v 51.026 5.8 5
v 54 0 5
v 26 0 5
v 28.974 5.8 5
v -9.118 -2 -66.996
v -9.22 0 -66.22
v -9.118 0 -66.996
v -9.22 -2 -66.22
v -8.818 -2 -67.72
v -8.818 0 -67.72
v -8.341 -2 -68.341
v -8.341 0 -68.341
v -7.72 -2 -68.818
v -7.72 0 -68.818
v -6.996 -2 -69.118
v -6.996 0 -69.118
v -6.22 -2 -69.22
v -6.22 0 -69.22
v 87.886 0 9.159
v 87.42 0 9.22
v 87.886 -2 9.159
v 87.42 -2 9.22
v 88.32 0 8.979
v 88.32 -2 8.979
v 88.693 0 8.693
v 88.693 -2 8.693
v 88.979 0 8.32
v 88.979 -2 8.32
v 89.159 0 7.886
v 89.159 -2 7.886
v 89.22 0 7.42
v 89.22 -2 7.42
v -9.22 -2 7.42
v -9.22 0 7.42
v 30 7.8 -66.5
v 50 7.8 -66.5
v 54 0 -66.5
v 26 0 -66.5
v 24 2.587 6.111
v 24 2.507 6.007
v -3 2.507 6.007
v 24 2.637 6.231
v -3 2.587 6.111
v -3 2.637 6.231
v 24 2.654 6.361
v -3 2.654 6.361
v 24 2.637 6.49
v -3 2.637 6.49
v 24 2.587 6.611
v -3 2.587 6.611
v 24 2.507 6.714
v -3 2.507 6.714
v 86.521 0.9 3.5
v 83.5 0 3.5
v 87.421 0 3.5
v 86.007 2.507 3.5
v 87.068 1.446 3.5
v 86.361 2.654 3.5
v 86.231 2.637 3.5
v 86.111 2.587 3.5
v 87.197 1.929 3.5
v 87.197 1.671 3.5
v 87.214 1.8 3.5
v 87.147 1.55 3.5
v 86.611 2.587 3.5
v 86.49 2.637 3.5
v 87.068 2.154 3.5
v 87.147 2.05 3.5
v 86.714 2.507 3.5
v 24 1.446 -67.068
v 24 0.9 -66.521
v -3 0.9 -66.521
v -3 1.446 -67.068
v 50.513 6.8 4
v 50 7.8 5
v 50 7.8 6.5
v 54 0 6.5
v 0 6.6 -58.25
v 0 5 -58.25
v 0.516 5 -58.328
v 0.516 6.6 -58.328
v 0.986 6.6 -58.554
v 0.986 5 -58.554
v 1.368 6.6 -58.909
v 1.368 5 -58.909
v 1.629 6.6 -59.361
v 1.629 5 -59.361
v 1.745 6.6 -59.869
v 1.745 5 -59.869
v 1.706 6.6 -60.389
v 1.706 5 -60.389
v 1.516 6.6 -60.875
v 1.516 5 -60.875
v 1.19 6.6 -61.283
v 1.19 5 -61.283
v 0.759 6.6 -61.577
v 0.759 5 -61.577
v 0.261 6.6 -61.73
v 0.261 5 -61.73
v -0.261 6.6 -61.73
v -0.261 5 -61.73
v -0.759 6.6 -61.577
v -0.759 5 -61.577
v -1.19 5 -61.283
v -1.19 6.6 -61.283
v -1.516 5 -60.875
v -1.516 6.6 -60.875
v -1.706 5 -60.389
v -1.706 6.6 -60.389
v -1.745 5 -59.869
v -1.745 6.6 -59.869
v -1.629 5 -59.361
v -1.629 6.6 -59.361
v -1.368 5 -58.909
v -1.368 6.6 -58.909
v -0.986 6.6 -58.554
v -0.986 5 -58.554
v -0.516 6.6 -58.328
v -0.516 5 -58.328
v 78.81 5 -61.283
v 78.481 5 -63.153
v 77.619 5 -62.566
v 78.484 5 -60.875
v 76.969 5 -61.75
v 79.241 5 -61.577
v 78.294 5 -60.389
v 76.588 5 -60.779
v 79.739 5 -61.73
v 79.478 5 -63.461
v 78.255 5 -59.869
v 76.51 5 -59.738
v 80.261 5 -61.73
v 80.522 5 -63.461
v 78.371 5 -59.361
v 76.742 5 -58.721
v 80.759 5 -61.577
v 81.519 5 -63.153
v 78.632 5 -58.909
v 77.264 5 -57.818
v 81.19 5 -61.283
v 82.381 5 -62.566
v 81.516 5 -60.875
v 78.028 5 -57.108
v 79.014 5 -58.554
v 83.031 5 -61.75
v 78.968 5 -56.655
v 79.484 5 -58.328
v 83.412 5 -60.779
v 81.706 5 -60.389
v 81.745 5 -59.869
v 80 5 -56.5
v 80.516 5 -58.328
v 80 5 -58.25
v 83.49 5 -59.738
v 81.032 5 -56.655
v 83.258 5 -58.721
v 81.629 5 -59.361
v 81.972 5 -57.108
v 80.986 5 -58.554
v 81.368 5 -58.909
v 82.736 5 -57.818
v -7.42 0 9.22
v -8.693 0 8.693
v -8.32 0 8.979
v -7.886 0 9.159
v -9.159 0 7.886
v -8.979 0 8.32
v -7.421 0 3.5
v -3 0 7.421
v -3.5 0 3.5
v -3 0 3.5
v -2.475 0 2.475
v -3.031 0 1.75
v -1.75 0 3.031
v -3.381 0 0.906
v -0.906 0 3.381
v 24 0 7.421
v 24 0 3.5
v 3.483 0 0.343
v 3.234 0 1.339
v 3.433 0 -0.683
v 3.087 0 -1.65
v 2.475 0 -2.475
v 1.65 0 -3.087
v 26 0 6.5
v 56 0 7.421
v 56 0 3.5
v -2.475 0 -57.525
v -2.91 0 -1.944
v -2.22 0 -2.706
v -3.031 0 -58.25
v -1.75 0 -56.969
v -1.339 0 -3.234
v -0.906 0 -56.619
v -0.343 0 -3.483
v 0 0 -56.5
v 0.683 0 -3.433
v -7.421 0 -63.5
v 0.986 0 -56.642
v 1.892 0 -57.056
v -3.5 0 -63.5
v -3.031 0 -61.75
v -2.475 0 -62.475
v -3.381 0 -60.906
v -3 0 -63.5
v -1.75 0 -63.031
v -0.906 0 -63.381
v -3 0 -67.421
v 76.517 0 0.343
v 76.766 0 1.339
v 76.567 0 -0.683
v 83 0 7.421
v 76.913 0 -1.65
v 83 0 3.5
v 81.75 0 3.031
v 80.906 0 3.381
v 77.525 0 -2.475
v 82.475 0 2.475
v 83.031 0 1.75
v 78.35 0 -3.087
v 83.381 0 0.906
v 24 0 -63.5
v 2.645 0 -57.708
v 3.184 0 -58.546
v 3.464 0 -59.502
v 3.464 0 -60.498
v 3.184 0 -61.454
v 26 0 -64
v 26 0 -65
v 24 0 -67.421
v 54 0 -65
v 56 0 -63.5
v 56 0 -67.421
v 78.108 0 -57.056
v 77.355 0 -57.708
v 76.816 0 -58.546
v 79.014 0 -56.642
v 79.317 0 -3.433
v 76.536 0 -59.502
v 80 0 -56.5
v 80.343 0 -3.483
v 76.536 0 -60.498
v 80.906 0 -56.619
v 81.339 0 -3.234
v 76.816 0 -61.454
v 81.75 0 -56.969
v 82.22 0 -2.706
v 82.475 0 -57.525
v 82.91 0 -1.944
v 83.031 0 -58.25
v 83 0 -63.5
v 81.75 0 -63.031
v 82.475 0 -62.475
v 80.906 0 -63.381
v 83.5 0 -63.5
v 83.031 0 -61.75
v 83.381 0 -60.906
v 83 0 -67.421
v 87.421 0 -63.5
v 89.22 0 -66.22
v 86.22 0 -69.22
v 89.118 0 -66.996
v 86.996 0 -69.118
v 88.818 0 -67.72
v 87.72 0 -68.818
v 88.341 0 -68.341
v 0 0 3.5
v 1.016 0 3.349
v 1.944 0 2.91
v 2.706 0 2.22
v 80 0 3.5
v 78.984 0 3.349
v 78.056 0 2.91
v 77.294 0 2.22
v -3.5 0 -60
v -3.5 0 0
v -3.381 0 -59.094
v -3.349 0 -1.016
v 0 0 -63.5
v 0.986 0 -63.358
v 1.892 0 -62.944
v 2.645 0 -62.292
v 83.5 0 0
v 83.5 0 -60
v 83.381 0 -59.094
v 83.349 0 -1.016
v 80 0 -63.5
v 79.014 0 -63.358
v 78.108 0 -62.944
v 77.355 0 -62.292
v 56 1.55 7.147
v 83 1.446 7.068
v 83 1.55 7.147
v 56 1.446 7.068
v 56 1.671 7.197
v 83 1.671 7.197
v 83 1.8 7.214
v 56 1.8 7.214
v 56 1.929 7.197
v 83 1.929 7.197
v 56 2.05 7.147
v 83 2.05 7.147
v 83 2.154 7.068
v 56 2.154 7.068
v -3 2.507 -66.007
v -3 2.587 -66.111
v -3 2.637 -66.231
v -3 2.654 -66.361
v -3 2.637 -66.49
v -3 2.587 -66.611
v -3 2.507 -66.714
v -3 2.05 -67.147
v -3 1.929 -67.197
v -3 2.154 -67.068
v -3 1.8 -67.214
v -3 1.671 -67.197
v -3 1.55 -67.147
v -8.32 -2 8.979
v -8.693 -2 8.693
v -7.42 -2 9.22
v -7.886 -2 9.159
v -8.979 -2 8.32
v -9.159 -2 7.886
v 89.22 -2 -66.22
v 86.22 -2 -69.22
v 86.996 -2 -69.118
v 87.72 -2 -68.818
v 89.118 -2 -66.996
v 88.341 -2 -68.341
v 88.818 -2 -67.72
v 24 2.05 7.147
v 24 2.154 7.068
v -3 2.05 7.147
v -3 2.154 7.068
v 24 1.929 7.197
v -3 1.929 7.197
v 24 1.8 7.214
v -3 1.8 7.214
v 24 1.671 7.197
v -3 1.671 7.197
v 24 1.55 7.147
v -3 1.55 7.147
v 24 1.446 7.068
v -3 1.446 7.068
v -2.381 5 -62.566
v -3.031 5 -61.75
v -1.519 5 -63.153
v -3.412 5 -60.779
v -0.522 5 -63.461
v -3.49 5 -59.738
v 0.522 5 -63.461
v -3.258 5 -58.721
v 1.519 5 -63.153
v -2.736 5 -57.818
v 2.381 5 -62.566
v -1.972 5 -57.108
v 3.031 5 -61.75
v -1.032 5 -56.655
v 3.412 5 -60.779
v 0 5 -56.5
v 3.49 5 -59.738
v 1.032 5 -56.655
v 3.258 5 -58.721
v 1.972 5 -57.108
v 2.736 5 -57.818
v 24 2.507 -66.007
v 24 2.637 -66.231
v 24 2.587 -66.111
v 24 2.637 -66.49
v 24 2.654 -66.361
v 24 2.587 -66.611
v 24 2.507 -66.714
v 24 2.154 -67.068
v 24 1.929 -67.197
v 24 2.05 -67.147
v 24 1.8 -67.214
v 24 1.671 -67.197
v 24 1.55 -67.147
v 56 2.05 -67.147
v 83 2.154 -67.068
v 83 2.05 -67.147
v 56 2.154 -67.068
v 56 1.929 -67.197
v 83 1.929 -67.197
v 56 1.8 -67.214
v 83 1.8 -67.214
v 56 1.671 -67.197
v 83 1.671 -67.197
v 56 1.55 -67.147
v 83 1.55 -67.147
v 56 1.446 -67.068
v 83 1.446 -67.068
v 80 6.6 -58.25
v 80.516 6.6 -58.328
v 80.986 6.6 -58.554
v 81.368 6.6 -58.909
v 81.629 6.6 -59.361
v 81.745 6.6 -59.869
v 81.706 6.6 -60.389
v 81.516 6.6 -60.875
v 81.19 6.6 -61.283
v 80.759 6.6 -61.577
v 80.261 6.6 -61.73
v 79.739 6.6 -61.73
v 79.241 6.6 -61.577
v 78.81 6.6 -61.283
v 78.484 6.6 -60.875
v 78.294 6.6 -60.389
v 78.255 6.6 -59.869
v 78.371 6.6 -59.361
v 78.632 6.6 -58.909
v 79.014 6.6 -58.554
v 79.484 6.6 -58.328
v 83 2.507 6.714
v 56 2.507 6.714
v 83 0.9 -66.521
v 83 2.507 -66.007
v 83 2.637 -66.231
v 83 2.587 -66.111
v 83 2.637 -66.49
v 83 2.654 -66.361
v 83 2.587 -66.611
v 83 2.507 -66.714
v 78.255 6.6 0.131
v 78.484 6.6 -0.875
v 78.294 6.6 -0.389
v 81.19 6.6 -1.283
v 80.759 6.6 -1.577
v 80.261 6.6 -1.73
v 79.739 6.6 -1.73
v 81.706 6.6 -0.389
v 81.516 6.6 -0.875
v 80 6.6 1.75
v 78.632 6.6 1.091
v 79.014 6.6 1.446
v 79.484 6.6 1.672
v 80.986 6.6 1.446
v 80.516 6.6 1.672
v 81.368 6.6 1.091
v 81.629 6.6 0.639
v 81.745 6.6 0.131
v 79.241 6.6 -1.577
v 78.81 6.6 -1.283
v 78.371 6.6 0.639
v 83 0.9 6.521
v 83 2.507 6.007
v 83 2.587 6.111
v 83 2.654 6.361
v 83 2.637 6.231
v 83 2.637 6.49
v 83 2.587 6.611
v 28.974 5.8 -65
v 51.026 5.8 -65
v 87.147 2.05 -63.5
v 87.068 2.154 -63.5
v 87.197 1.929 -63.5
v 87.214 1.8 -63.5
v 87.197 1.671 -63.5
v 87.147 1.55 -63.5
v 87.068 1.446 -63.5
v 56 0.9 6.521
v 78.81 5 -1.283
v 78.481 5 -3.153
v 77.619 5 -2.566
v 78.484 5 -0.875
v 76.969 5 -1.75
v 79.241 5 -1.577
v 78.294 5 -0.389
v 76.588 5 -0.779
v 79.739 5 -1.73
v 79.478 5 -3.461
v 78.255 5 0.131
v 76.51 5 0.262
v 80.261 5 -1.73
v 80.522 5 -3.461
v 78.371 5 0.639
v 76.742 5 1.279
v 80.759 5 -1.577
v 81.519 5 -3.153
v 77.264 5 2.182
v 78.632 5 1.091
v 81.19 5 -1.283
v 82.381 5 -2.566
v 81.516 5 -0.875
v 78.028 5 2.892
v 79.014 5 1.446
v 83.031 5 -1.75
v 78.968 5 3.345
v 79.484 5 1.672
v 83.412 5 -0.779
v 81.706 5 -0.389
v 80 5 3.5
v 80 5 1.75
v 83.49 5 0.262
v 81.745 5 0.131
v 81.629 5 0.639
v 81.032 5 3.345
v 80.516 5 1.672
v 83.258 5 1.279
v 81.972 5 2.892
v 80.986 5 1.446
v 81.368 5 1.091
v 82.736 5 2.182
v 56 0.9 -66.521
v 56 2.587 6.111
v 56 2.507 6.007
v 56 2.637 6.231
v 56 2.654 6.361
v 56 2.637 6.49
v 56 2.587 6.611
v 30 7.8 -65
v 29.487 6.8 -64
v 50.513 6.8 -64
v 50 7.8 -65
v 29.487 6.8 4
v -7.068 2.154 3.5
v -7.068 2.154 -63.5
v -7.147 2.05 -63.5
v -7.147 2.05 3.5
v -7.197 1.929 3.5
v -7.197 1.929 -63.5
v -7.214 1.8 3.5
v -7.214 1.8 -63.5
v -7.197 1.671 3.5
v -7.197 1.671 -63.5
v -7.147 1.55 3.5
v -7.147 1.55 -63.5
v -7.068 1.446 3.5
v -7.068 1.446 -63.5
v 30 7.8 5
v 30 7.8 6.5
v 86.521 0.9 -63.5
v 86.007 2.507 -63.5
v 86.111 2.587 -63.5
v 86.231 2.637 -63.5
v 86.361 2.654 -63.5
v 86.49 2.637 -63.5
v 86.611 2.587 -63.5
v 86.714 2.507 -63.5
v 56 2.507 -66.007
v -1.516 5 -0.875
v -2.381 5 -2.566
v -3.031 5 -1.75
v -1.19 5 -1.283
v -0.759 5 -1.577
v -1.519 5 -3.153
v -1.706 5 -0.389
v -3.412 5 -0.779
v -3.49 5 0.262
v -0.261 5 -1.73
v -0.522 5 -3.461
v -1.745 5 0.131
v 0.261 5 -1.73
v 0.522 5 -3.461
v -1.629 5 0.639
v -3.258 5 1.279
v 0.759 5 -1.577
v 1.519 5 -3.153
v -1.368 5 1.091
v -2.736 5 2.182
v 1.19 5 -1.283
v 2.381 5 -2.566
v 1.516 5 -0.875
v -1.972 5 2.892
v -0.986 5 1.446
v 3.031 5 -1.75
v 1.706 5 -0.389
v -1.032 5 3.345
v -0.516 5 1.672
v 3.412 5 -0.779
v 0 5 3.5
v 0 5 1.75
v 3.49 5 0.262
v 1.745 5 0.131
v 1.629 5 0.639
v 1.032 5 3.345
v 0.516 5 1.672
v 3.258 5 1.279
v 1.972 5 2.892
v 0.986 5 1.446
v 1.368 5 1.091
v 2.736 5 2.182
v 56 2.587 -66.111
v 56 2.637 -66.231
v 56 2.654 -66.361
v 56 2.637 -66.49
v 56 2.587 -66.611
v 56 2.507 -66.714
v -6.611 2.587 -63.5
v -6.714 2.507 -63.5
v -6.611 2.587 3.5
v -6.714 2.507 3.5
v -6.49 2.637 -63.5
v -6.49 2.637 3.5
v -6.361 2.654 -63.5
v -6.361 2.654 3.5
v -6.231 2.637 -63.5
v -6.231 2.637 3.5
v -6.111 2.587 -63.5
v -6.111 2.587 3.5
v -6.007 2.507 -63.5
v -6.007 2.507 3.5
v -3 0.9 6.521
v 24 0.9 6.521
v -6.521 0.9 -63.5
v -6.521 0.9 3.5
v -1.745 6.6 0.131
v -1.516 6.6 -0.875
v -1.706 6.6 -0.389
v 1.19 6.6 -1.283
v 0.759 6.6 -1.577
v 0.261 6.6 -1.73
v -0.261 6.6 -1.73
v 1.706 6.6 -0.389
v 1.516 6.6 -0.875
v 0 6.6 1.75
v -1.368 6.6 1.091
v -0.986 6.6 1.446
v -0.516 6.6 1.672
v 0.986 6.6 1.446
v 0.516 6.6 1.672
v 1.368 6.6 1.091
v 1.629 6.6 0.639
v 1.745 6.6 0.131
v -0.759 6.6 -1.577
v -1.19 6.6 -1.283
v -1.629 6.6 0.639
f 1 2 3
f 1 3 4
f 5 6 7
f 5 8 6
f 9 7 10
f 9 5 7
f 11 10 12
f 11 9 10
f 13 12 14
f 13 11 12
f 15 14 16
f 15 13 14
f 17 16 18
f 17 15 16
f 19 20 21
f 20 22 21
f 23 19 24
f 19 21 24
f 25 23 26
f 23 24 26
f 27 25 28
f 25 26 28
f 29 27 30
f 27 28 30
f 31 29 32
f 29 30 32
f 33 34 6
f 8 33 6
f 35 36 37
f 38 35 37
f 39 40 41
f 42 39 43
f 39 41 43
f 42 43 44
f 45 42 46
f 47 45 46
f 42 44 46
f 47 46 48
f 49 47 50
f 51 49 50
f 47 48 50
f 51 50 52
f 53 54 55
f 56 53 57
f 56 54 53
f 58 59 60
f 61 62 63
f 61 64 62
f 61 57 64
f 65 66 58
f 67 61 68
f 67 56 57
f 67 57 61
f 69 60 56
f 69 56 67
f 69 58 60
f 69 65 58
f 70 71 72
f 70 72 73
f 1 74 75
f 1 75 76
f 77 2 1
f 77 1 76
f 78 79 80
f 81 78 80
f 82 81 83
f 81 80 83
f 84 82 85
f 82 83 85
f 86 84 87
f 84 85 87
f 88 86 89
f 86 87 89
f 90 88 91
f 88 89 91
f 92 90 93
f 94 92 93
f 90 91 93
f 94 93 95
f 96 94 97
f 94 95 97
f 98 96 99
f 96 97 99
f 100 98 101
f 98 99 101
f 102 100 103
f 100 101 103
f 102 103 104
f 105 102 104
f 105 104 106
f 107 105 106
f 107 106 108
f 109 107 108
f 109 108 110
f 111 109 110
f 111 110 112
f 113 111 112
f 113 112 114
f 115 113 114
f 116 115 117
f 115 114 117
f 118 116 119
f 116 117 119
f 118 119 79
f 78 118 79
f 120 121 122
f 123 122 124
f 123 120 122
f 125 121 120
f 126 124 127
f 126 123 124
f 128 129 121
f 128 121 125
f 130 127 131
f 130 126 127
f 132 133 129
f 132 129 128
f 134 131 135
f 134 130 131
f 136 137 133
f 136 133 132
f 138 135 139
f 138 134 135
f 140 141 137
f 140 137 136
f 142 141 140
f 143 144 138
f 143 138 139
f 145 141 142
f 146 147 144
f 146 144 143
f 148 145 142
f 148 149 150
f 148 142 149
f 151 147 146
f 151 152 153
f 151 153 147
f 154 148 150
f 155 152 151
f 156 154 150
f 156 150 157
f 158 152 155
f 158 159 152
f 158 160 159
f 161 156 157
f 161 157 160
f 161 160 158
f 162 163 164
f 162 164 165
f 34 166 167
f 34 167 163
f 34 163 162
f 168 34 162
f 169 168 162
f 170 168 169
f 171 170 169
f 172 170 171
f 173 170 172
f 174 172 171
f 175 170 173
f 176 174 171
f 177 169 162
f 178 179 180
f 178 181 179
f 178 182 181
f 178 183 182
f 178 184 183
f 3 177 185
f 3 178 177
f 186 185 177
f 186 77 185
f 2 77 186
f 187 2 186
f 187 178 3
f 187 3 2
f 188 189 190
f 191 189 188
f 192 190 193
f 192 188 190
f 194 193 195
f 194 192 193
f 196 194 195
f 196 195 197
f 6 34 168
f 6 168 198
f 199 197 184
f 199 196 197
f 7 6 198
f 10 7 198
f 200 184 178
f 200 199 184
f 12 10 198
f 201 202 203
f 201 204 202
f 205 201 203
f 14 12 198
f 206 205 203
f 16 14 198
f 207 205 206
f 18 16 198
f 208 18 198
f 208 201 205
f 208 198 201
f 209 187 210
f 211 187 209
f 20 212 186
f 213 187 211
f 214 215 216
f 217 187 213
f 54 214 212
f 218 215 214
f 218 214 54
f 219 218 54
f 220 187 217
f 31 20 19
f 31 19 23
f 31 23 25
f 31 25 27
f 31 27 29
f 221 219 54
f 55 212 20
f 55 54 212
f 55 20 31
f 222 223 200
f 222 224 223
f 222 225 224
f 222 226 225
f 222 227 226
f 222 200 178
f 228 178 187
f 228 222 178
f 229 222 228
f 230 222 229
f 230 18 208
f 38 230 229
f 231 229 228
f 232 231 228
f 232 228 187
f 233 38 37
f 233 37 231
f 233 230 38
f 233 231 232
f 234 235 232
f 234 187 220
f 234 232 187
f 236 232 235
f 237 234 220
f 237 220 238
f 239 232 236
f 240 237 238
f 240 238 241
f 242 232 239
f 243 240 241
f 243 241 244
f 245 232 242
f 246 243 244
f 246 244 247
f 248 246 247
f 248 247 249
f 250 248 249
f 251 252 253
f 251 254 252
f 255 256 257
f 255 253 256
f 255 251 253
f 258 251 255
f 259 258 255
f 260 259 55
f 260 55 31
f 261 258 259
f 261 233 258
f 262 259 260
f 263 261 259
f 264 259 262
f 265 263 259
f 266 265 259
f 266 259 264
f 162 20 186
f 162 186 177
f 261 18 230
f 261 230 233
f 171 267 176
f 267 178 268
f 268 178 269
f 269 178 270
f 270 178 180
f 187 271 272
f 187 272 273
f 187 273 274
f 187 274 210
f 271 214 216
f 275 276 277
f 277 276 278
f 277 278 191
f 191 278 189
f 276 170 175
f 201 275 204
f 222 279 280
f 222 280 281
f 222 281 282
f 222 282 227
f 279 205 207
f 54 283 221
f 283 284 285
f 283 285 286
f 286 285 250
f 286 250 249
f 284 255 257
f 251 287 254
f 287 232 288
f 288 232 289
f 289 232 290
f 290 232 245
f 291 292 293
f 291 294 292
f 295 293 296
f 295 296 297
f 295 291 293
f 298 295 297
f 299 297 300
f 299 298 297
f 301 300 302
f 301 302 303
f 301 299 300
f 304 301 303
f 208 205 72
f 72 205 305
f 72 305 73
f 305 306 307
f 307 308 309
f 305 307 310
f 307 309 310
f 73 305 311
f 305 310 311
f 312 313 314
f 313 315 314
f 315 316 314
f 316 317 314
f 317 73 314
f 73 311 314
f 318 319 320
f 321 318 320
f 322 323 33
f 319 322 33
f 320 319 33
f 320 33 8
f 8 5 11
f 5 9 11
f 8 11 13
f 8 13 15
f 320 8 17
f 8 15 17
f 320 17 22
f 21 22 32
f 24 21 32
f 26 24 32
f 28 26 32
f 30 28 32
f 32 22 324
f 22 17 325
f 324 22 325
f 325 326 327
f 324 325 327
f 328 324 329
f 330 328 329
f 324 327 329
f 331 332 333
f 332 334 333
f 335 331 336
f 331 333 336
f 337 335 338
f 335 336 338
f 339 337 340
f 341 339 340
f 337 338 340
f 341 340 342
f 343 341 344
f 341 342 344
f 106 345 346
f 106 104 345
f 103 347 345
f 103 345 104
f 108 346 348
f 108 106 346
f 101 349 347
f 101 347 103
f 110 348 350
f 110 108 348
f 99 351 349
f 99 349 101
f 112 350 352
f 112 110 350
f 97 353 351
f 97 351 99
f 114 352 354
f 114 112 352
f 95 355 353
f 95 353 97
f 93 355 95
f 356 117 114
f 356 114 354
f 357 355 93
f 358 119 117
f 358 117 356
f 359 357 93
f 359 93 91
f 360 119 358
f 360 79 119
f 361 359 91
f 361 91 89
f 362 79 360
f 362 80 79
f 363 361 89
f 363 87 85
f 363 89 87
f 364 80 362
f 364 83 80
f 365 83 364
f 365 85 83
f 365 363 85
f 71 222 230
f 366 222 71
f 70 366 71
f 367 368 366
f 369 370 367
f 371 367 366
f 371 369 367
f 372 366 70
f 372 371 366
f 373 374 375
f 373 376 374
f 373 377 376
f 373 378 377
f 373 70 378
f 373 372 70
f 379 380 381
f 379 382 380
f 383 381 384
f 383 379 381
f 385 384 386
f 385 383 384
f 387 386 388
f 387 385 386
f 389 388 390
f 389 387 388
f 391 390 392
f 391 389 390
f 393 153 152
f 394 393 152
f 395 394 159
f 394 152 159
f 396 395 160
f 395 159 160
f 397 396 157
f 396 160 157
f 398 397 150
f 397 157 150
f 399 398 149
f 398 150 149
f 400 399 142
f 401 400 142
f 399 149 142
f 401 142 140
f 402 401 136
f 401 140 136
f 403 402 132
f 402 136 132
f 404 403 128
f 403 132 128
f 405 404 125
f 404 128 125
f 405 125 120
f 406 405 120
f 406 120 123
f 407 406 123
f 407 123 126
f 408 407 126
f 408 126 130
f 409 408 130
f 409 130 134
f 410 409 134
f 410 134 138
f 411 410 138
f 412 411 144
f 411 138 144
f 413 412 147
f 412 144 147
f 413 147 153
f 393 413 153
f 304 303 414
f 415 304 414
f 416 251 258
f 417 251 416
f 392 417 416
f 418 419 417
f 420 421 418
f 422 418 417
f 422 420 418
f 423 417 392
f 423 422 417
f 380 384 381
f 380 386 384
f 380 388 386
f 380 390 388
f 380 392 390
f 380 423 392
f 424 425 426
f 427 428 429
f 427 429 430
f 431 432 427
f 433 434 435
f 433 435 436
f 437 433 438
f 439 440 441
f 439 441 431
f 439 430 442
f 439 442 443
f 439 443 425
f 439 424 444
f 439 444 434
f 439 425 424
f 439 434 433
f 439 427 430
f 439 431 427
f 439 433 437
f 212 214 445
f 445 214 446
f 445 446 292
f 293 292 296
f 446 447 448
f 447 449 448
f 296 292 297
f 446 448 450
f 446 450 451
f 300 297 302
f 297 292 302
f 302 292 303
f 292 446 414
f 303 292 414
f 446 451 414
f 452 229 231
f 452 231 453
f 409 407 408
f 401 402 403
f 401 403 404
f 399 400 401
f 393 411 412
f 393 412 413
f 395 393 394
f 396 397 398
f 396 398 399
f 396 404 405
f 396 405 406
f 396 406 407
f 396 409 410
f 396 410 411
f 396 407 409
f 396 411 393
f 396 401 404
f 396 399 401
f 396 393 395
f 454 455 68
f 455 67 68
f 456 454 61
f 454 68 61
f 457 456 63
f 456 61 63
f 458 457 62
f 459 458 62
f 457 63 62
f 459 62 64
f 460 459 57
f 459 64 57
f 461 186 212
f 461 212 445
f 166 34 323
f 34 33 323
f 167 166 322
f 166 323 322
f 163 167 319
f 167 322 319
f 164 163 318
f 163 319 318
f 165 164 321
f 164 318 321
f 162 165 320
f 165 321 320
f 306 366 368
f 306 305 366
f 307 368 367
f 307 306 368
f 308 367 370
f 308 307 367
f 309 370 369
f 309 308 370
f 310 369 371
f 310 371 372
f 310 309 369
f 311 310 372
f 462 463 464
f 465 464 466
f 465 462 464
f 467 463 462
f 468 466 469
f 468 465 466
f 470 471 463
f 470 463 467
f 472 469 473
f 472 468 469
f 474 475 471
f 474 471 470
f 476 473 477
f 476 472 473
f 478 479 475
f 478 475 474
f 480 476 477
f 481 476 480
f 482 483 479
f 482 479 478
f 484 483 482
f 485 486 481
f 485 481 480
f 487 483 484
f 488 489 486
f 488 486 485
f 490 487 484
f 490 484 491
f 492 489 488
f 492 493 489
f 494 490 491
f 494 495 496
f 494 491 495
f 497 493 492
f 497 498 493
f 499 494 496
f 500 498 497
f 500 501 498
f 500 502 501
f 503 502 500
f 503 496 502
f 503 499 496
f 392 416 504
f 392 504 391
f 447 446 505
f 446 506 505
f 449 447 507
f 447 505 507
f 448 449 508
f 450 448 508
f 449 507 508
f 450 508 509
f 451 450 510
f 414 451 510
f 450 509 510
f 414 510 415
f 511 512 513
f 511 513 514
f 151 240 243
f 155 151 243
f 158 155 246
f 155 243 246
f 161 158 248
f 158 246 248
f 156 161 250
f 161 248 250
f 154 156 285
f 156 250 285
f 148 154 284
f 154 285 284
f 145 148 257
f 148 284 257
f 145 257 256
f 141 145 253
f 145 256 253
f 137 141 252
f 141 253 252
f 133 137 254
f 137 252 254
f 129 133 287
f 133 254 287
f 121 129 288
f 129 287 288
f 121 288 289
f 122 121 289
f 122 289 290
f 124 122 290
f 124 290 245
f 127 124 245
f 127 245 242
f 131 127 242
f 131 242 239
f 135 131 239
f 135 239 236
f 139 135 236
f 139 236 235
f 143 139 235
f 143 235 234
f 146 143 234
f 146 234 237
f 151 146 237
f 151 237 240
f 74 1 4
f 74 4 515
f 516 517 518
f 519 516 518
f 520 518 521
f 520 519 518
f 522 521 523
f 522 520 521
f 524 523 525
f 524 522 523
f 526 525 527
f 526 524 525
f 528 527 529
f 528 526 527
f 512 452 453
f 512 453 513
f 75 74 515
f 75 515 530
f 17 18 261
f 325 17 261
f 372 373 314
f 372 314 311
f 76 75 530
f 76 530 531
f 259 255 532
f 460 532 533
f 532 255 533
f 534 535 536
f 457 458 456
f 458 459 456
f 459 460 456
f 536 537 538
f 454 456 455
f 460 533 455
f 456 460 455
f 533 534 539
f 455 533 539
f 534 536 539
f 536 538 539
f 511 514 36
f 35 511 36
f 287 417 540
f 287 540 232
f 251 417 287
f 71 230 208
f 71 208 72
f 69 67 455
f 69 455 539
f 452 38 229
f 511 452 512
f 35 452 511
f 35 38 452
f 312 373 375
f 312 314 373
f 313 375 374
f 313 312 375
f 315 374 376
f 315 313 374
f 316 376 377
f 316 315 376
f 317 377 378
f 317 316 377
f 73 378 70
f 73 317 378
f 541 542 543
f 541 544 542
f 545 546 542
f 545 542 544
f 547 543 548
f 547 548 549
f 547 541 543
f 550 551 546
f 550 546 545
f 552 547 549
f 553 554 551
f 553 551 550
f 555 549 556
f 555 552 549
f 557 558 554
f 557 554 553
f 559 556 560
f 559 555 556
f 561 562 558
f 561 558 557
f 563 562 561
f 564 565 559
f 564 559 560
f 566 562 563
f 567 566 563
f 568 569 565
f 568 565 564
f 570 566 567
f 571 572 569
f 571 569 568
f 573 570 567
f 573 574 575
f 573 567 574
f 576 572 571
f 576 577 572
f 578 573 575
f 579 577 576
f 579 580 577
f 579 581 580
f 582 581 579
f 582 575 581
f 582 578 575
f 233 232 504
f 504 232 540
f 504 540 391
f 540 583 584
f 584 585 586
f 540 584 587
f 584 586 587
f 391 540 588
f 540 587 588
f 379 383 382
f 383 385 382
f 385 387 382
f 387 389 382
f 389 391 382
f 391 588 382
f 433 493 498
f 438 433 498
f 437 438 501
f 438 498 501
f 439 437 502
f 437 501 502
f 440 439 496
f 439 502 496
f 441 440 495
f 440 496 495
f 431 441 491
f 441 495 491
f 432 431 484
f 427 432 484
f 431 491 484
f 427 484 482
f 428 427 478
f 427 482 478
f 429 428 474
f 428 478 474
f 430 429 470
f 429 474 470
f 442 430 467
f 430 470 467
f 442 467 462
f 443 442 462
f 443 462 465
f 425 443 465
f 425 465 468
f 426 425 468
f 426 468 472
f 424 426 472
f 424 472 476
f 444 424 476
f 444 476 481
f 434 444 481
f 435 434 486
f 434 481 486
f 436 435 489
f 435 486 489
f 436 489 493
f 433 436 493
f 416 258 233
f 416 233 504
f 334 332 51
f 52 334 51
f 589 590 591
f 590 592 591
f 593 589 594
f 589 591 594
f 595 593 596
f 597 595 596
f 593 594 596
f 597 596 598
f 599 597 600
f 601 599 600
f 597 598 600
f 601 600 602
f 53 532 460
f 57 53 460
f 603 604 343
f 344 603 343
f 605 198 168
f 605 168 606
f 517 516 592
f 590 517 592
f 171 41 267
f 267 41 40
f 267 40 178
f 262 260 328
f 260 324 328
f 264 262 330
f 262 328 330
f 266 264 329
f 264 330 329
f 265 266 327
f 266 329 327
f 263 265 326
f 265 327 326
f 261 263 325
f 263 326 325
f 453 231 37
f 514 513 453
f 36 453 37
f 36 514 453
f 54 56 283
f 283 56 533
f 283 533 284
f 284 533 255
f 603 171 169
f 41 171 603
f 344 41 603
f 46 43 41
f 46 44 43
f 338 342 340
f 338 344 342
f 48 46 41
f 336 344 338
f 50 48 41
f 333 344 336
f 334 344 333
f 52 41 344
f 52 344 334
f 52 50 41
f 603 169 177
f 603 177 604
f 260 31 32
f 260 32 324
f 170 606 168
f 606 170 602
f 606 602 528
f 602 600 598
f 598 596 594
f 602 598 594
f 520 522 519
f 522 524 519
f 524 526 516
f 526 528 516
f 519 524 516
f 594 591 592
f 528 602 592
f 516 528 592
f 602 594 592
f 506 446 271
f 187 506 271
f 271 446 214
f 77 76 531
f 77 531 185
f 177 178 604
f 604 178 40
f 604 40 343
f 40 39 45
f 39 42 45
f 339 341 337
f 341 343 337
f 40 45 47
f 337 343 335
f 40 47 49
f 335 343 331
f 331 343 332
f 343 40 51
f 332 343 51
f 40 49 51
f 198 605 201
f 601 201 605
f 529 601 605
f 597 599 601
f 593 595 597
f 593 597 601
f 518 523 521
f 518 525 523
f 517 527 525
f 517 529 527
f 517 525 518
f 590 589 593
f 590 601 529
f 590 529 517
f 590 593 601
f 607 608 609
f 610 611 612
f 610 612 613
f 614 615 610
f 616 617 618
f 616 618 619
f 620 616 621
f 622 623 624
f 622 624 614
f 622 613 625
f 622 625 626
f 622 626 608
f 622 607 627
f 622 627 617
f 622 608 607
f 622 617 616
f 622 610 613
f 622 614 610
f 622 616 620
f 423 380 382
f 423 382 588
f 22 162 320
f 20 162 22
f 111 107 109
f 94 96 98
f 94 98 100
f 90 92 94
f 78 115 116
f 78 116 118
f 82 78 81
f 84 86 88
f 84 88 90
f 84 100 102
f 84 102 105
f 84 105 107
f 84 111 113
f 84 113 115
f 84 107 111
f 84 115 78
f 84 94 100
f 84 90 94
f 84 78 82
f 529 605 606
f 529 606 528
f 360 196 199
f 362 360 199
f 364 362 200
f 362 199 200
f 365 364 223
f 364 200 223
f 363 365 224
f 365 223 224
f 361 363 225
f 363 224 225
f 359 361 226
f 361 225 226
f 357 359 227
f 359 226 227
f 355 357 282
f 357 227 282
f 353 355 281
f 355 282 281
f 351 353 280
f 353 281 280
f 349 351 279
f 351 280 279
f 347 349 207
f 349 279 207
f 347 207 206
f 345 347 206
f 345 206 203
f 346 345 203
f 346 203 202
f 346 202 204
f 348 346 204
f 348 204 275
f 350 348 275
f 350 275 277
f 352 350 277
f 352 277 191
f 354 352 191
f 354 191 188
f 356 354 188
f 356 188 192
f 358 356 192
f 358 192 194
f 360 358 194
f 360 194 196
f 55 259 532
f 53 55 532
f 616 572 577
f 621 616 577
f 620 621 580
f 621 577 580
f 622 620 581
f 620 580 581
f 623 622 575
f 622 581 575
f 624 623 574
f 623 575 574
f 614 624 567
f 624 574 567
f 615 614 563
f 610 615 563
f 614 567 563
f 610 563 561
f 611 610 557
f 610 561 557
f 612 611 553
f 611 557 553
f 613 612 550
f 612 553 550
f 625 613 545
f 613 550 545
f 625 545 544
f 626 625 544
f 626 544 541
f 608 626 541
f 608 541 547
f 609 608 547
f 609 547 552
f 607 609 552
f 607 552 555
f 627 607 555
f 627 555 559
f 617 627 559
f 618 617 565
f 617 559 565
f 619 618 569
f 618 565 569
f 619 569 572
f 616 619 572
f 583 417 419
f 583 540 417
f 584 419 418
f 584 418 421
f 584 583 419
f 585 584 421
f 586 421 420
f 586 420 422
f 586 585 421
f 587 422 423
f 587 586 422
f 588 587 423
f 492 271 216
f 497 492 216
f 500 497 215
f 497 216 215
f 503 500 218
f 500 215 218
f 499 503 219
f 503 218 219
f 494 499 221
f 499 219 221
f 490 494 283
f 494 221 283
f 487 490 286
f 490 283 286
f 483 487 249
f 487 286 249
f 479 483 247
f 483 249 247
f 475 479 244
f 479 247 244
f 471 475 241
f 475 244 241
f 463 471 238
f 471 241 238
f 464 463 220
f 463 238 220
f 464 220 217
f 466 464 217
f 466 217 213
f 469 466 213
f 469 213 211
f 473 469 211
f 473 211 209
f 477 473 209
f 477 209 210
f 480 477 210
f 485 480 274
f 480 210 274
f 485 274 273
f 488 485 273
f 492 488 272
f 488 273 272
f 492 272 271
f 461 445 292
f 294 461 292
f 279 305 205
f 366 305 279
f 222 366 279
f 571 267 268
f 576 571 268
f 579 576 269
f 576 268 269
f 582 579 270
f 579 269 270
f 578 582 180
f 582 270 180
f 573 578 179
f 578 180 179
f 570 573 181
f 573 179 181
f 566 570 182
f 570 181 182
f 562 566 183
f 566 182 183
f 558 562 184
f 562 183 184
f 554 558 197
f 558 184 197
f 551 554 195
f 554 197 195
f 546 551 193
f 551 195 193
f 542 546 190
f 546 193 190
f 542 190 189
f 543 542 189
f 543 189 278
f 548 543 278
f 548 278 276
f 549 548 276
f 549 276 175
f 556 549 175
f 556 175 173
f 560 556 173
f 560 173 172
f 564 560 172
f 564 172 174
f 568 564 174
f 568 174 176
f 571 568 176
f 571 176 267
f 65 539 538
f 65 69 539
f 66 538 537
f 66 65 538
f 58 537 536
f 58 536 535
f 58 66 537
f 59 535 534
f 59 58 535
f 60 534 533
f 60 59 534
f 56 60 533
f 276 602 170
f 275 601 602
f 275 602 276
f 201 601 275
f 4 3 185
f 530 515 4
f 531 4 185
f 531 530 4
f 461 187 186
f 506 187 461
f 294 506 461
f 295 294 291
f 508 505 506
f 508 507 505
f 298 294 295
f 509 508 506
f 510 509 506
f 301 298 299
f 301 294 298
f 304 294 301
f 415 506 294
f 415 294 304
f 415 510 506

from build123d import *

# Parameters (mm, degrees)
SKETCH2_R            = 3.5
BOSS_EXTRUDE1_DEPTH  = 5
SKETCH3_R            = 1.75
BOSS_EXTRUDE2_DEPTH  = 1.6
SKETCH1_W            = 98.44
SKETCH1_H            = 78.44
BOSS_EXTRUDE4_DEPTH  = 2
BOSS_EXTRUDE5_START  = -63.5
BOSS_EXTRUDE5_DEPTH  = 67
FILLET1_R            = 0.5
FILLET1_OF_MIRROR1_R = 0.5
BOSS_EXTRUDE8_DEPTH  = 43
CUT_EXTRUDE4_DEPTH   = 16
BOSS_EXTRUDE9_DEPTH  = 14
CHAMFER3_START       = -66.5
CHAMFER3_DEPTH       = 2.5
CHAMFER4_SIZE2       = 4
CHAMFER4_SIZE        = 7.8
FILLET2_R            = 0.5
FILLET2_OF_MIRROR2_R = 0.5
FILLET3_R            = 3
CHAMFER5_SIZE2       = 4
CHAMFER5_SIZE        = 7.8
CHAMFER6_SIZE2       = 7.8
CHAMFER6_SIZE        = 4
FILLET4_R            = 1.8


with BuildPart() as part:
    # Sketch2 → Boss-Extrude1 (new body)
    with BuildSketch(Plane(origin=(0, 0, 0), x_dir=(1, 0, 0), z_dir=(0, 1, 0))):
        with Locations(Location((0, 0, 0), (0, 0, 270))):
            Circle(SKETCH2_R)
    boss_extrude1 = extrude(amount=BOSS_EXTRUDE1_DEPTH)

    # Sketch3 → Boss-Extrude2 (add)
    with BuildSketch(Plane(origin=(0, 5, 0), x_dir=(1, 0, 0), z_dir=(0, 1, 0))):
        with Locations(Location((0, 0, 0), (0, 0, 270))):
            Circle(SKETCH3_R)
    boss_extrude2 = extrude(amount=BOSS_EXTRUDE2_DEPTH)

    # Sketch1 → Boss-Extrude4 (add)
    with BuildSketch(Plane(origin=(0, 0, 0), x_dir=(1, 0, 0), z_dir=(0, 1, 0))):
        with Locations((40, 30)):
            Rectangle(SKETCH1_W, SKETCH1_H)
    extrude(amount=-BOSS_EXTRUDE4_DEPTH)

    # Sketch-Pattern2: Boss-Extrude1, Boss-Extrude2 at 3 more places
    with Locations((80, 0, 0), (80, 0, -60), (0, 0, -60)):
        add(boss_extrude1)
        add(boss_extrude2)

    # Sketch6 → Boss-Extrude5 (add)
    with BuildSketch(Plane.XY.offset(BOSS_EXTRUDE5_START)):
        Polygon((-7.421320344, 1.8), (-6.360660172, 2.860660172), (-3.5, 0), (-7.421320344, 0), (-6.521320344, 0.9), align=None)
    boss_extrude5 = extrude(amount=BOSS_EXTRUDE5_DEPTH)

    # Fillet1
    fillet1_edges = [part.edges().sort_by_distance(p)[0] for p in [
        (-7.421320344, 1.8, -30),
        (-6.360660172, 2.860660172, -30),
    ]]
    fillet(fillet1_edges, radius=FILLET1_R)

    # Mirror1: Boss-Extrude5 across plane
    add(boss_extrude5.mirror(Plane(origin=(40, 0, 0), x_dir=(0, 0, 1), z_dir=(1, 0, 0))))

    # Fillet1 of Mirror1
    fillet1_of_mirror1_edges = [part.edges().sort_by_distance(p)[0] for p in [
        (87.421320344, 1.8, -30),
        (86.360660172, 2.860660172, -30),
    ]]
    fillet(fillet1_of_mirror1_edges, radius=FILLET1_OF_MIRROR1_R)

    # Sketch8 → Boss-Extrude8 (add, symmetric)
    with BuildSketch(Plane(origin=(40, 0, 0), x_dir=(0, 0, -1), z_dir=(1, 0, 0))):
        Polygon((66.360660172, 2.860660172), (63.5, 0), (67.421320344, 0), (66.521320344, 0.9), (67.421320344, 1.8), align=None)
    boss_extrude8 = extrude(amount=BOSS_EXTRUDE8_DEPTH, both=True)

    # Sketch8<4> → Cut-Extrude4 (cut, symmetric)
    with BuildSketch(Plane(origin=(40, 0, 0), x_dir=(0, 0, -1), z_dir=(1, 0, 0))):
        Polygon((66.360660172, 2.860660172), (63.5, 0), (67.421320344, 0), (66.521320344, 0.9), (67.421320344, 1.8), align=None)
    cut_extrude4 = extrude(amount=CUT_EXTRUDE4_DEPTH, both=True, mode=Mode.SUBTRACT)

    # Sketch7 → Boss-Extrude9 (add, symmetric)
    with BuildSketch(Plane(origin=(40, 0, 0), x_dir=(0, 0, -1), z_dir=(1, 0, 0))):
        Polygon((66.5, 7.8), (66.5, 0), (65, 0), (65, 5.8), (64, 6.8), (65, 7.8), align=None)
    boss_extrude9 = extrude(amount=BOSS_EXTRUDE9_DEPTH, both=True)

    # Chamfer3: read off the stored shape, not the designer's step
    # Chamfer3 outline → Chamfer3 (cut)
    with BuildSketch(Plane.XY.offset(CHAMFER3_START)):
        Polygon((26, 7.8), (26, 0), (30, 7.8), align=None)
    extrude(amount=CHAMFER3_DEPTH, mode=Mode.SUBTRACT)

    # Chamfer4
    chamfer4_edges = [part.edges().sort_by_distance(p)[0] for p in [
        (54, 7.8, -65.75),
    ]]
    chamfer4_side = [part.faces().sort_by_distance(p)[0] for p in [
        (54, 7.72, -65.75),
    ]]
    chamfer(chamfer4_edges, length=CHAMFER4_SIZE - 0.0001, length2=CHAMFER4_SIZE2 - 0.0001, reference=chamfer4_side[0])  # a hair under: the kernel refuses the full size

    # Fillet2
    fillet2_edges = [part.edges().sort_by_distance(p)[0] for p in [
        (10.5, 2.860660172, -66.360660172),
        (10.5, 1.8, -67.421320344),
        (69.5, 2.860660172, -66.360660172),
        (69.5, 1.8, -67.421320344),
    ]]
    fillet(fillet2_edges, radius=FILLET2_R)

    # Mirror2: Boss-Extrude8, Cut-Extrude4 across plane
    add(boss_extrude8.mirror(Plane.XY.offset(-30)))
    add(cut_extrude4.mirror(Plane.XY.offset(-30)), mode=Mode.SUBTRACT)

    # Fillet2 of Mirror2
    fillet2_of_mirror2_edges = [part.edges().sort_by_distance(p)[0] for p in [
        (10.5, 2.860660172, 6.360660172),
        (10.5, 1.8, 7.421320344),
        (69.5, 2.860660172, 6.360660172),
        (69.5, 1.8, 7.421320344),
    ]]
    fillet(fillet2_of_mirror2_edges, radius=FILLET2_OF_MIRROR2_R)

    # Fillet3
    fillet3_edges = [part.edges().sort_by_distance(p)[0] for p in [
        (-9.22, -1, -69.22),
        (89.22, -1, -69.22),
    ]]
    fillet(fillet3_edges, radius=FILLET3_R)

    # Mirror4: Boss-Extrude9 across plane
    add(boss_extrude9.mirror(Plane.XY.offset(-30)))

    # Chamfer5
    chamfer5_edges = [part.edges().sort_by_distance(p)[0] for p in [
        (26, 7.8, 5.75),
    ]]
    chamfer5_side = [part.faces().sort_by_distance(p)[0] for p in [
        (26, 7.72, 5.75),
    ]]
    chamfer(chamfer5_edges, length=CHAMFER5_SIZE - 0.0001, length2=CHAMFER5_SIZE2 - 0.0001, reference=chamfer5_side[0])  # a hair under: the kernel refuses the full size

    # Chamfer6
    chamfer6_edges = [part.edges().sort_by_distance(p)[0] for p in [
        (54, 7.8, 5.75),
    ]]
    chamfer6_side = [part.faces().sort_by_distance(p)[0] for p in [
        (53.92, 7.8, 5.75),
    ]]
    chamfer(chamfer6_edges, length=CHAMFER6_SIZE - 0.0001, length2=CHAMFER6_SIZE2 - 0.0001, reference=chamfer6_side[0])  # a hair under: the kernel refuses the full size

    # Fillet4
    fillet4_edges = [part.edges().sort_by_distance(p)[0] for p in [
        (89.22, -1, 9.22),
        (-9.22, -1, 9.22),
    ]]
    fillet(fillet4_edges, radius=FILLET4_R)


solid = part.part
